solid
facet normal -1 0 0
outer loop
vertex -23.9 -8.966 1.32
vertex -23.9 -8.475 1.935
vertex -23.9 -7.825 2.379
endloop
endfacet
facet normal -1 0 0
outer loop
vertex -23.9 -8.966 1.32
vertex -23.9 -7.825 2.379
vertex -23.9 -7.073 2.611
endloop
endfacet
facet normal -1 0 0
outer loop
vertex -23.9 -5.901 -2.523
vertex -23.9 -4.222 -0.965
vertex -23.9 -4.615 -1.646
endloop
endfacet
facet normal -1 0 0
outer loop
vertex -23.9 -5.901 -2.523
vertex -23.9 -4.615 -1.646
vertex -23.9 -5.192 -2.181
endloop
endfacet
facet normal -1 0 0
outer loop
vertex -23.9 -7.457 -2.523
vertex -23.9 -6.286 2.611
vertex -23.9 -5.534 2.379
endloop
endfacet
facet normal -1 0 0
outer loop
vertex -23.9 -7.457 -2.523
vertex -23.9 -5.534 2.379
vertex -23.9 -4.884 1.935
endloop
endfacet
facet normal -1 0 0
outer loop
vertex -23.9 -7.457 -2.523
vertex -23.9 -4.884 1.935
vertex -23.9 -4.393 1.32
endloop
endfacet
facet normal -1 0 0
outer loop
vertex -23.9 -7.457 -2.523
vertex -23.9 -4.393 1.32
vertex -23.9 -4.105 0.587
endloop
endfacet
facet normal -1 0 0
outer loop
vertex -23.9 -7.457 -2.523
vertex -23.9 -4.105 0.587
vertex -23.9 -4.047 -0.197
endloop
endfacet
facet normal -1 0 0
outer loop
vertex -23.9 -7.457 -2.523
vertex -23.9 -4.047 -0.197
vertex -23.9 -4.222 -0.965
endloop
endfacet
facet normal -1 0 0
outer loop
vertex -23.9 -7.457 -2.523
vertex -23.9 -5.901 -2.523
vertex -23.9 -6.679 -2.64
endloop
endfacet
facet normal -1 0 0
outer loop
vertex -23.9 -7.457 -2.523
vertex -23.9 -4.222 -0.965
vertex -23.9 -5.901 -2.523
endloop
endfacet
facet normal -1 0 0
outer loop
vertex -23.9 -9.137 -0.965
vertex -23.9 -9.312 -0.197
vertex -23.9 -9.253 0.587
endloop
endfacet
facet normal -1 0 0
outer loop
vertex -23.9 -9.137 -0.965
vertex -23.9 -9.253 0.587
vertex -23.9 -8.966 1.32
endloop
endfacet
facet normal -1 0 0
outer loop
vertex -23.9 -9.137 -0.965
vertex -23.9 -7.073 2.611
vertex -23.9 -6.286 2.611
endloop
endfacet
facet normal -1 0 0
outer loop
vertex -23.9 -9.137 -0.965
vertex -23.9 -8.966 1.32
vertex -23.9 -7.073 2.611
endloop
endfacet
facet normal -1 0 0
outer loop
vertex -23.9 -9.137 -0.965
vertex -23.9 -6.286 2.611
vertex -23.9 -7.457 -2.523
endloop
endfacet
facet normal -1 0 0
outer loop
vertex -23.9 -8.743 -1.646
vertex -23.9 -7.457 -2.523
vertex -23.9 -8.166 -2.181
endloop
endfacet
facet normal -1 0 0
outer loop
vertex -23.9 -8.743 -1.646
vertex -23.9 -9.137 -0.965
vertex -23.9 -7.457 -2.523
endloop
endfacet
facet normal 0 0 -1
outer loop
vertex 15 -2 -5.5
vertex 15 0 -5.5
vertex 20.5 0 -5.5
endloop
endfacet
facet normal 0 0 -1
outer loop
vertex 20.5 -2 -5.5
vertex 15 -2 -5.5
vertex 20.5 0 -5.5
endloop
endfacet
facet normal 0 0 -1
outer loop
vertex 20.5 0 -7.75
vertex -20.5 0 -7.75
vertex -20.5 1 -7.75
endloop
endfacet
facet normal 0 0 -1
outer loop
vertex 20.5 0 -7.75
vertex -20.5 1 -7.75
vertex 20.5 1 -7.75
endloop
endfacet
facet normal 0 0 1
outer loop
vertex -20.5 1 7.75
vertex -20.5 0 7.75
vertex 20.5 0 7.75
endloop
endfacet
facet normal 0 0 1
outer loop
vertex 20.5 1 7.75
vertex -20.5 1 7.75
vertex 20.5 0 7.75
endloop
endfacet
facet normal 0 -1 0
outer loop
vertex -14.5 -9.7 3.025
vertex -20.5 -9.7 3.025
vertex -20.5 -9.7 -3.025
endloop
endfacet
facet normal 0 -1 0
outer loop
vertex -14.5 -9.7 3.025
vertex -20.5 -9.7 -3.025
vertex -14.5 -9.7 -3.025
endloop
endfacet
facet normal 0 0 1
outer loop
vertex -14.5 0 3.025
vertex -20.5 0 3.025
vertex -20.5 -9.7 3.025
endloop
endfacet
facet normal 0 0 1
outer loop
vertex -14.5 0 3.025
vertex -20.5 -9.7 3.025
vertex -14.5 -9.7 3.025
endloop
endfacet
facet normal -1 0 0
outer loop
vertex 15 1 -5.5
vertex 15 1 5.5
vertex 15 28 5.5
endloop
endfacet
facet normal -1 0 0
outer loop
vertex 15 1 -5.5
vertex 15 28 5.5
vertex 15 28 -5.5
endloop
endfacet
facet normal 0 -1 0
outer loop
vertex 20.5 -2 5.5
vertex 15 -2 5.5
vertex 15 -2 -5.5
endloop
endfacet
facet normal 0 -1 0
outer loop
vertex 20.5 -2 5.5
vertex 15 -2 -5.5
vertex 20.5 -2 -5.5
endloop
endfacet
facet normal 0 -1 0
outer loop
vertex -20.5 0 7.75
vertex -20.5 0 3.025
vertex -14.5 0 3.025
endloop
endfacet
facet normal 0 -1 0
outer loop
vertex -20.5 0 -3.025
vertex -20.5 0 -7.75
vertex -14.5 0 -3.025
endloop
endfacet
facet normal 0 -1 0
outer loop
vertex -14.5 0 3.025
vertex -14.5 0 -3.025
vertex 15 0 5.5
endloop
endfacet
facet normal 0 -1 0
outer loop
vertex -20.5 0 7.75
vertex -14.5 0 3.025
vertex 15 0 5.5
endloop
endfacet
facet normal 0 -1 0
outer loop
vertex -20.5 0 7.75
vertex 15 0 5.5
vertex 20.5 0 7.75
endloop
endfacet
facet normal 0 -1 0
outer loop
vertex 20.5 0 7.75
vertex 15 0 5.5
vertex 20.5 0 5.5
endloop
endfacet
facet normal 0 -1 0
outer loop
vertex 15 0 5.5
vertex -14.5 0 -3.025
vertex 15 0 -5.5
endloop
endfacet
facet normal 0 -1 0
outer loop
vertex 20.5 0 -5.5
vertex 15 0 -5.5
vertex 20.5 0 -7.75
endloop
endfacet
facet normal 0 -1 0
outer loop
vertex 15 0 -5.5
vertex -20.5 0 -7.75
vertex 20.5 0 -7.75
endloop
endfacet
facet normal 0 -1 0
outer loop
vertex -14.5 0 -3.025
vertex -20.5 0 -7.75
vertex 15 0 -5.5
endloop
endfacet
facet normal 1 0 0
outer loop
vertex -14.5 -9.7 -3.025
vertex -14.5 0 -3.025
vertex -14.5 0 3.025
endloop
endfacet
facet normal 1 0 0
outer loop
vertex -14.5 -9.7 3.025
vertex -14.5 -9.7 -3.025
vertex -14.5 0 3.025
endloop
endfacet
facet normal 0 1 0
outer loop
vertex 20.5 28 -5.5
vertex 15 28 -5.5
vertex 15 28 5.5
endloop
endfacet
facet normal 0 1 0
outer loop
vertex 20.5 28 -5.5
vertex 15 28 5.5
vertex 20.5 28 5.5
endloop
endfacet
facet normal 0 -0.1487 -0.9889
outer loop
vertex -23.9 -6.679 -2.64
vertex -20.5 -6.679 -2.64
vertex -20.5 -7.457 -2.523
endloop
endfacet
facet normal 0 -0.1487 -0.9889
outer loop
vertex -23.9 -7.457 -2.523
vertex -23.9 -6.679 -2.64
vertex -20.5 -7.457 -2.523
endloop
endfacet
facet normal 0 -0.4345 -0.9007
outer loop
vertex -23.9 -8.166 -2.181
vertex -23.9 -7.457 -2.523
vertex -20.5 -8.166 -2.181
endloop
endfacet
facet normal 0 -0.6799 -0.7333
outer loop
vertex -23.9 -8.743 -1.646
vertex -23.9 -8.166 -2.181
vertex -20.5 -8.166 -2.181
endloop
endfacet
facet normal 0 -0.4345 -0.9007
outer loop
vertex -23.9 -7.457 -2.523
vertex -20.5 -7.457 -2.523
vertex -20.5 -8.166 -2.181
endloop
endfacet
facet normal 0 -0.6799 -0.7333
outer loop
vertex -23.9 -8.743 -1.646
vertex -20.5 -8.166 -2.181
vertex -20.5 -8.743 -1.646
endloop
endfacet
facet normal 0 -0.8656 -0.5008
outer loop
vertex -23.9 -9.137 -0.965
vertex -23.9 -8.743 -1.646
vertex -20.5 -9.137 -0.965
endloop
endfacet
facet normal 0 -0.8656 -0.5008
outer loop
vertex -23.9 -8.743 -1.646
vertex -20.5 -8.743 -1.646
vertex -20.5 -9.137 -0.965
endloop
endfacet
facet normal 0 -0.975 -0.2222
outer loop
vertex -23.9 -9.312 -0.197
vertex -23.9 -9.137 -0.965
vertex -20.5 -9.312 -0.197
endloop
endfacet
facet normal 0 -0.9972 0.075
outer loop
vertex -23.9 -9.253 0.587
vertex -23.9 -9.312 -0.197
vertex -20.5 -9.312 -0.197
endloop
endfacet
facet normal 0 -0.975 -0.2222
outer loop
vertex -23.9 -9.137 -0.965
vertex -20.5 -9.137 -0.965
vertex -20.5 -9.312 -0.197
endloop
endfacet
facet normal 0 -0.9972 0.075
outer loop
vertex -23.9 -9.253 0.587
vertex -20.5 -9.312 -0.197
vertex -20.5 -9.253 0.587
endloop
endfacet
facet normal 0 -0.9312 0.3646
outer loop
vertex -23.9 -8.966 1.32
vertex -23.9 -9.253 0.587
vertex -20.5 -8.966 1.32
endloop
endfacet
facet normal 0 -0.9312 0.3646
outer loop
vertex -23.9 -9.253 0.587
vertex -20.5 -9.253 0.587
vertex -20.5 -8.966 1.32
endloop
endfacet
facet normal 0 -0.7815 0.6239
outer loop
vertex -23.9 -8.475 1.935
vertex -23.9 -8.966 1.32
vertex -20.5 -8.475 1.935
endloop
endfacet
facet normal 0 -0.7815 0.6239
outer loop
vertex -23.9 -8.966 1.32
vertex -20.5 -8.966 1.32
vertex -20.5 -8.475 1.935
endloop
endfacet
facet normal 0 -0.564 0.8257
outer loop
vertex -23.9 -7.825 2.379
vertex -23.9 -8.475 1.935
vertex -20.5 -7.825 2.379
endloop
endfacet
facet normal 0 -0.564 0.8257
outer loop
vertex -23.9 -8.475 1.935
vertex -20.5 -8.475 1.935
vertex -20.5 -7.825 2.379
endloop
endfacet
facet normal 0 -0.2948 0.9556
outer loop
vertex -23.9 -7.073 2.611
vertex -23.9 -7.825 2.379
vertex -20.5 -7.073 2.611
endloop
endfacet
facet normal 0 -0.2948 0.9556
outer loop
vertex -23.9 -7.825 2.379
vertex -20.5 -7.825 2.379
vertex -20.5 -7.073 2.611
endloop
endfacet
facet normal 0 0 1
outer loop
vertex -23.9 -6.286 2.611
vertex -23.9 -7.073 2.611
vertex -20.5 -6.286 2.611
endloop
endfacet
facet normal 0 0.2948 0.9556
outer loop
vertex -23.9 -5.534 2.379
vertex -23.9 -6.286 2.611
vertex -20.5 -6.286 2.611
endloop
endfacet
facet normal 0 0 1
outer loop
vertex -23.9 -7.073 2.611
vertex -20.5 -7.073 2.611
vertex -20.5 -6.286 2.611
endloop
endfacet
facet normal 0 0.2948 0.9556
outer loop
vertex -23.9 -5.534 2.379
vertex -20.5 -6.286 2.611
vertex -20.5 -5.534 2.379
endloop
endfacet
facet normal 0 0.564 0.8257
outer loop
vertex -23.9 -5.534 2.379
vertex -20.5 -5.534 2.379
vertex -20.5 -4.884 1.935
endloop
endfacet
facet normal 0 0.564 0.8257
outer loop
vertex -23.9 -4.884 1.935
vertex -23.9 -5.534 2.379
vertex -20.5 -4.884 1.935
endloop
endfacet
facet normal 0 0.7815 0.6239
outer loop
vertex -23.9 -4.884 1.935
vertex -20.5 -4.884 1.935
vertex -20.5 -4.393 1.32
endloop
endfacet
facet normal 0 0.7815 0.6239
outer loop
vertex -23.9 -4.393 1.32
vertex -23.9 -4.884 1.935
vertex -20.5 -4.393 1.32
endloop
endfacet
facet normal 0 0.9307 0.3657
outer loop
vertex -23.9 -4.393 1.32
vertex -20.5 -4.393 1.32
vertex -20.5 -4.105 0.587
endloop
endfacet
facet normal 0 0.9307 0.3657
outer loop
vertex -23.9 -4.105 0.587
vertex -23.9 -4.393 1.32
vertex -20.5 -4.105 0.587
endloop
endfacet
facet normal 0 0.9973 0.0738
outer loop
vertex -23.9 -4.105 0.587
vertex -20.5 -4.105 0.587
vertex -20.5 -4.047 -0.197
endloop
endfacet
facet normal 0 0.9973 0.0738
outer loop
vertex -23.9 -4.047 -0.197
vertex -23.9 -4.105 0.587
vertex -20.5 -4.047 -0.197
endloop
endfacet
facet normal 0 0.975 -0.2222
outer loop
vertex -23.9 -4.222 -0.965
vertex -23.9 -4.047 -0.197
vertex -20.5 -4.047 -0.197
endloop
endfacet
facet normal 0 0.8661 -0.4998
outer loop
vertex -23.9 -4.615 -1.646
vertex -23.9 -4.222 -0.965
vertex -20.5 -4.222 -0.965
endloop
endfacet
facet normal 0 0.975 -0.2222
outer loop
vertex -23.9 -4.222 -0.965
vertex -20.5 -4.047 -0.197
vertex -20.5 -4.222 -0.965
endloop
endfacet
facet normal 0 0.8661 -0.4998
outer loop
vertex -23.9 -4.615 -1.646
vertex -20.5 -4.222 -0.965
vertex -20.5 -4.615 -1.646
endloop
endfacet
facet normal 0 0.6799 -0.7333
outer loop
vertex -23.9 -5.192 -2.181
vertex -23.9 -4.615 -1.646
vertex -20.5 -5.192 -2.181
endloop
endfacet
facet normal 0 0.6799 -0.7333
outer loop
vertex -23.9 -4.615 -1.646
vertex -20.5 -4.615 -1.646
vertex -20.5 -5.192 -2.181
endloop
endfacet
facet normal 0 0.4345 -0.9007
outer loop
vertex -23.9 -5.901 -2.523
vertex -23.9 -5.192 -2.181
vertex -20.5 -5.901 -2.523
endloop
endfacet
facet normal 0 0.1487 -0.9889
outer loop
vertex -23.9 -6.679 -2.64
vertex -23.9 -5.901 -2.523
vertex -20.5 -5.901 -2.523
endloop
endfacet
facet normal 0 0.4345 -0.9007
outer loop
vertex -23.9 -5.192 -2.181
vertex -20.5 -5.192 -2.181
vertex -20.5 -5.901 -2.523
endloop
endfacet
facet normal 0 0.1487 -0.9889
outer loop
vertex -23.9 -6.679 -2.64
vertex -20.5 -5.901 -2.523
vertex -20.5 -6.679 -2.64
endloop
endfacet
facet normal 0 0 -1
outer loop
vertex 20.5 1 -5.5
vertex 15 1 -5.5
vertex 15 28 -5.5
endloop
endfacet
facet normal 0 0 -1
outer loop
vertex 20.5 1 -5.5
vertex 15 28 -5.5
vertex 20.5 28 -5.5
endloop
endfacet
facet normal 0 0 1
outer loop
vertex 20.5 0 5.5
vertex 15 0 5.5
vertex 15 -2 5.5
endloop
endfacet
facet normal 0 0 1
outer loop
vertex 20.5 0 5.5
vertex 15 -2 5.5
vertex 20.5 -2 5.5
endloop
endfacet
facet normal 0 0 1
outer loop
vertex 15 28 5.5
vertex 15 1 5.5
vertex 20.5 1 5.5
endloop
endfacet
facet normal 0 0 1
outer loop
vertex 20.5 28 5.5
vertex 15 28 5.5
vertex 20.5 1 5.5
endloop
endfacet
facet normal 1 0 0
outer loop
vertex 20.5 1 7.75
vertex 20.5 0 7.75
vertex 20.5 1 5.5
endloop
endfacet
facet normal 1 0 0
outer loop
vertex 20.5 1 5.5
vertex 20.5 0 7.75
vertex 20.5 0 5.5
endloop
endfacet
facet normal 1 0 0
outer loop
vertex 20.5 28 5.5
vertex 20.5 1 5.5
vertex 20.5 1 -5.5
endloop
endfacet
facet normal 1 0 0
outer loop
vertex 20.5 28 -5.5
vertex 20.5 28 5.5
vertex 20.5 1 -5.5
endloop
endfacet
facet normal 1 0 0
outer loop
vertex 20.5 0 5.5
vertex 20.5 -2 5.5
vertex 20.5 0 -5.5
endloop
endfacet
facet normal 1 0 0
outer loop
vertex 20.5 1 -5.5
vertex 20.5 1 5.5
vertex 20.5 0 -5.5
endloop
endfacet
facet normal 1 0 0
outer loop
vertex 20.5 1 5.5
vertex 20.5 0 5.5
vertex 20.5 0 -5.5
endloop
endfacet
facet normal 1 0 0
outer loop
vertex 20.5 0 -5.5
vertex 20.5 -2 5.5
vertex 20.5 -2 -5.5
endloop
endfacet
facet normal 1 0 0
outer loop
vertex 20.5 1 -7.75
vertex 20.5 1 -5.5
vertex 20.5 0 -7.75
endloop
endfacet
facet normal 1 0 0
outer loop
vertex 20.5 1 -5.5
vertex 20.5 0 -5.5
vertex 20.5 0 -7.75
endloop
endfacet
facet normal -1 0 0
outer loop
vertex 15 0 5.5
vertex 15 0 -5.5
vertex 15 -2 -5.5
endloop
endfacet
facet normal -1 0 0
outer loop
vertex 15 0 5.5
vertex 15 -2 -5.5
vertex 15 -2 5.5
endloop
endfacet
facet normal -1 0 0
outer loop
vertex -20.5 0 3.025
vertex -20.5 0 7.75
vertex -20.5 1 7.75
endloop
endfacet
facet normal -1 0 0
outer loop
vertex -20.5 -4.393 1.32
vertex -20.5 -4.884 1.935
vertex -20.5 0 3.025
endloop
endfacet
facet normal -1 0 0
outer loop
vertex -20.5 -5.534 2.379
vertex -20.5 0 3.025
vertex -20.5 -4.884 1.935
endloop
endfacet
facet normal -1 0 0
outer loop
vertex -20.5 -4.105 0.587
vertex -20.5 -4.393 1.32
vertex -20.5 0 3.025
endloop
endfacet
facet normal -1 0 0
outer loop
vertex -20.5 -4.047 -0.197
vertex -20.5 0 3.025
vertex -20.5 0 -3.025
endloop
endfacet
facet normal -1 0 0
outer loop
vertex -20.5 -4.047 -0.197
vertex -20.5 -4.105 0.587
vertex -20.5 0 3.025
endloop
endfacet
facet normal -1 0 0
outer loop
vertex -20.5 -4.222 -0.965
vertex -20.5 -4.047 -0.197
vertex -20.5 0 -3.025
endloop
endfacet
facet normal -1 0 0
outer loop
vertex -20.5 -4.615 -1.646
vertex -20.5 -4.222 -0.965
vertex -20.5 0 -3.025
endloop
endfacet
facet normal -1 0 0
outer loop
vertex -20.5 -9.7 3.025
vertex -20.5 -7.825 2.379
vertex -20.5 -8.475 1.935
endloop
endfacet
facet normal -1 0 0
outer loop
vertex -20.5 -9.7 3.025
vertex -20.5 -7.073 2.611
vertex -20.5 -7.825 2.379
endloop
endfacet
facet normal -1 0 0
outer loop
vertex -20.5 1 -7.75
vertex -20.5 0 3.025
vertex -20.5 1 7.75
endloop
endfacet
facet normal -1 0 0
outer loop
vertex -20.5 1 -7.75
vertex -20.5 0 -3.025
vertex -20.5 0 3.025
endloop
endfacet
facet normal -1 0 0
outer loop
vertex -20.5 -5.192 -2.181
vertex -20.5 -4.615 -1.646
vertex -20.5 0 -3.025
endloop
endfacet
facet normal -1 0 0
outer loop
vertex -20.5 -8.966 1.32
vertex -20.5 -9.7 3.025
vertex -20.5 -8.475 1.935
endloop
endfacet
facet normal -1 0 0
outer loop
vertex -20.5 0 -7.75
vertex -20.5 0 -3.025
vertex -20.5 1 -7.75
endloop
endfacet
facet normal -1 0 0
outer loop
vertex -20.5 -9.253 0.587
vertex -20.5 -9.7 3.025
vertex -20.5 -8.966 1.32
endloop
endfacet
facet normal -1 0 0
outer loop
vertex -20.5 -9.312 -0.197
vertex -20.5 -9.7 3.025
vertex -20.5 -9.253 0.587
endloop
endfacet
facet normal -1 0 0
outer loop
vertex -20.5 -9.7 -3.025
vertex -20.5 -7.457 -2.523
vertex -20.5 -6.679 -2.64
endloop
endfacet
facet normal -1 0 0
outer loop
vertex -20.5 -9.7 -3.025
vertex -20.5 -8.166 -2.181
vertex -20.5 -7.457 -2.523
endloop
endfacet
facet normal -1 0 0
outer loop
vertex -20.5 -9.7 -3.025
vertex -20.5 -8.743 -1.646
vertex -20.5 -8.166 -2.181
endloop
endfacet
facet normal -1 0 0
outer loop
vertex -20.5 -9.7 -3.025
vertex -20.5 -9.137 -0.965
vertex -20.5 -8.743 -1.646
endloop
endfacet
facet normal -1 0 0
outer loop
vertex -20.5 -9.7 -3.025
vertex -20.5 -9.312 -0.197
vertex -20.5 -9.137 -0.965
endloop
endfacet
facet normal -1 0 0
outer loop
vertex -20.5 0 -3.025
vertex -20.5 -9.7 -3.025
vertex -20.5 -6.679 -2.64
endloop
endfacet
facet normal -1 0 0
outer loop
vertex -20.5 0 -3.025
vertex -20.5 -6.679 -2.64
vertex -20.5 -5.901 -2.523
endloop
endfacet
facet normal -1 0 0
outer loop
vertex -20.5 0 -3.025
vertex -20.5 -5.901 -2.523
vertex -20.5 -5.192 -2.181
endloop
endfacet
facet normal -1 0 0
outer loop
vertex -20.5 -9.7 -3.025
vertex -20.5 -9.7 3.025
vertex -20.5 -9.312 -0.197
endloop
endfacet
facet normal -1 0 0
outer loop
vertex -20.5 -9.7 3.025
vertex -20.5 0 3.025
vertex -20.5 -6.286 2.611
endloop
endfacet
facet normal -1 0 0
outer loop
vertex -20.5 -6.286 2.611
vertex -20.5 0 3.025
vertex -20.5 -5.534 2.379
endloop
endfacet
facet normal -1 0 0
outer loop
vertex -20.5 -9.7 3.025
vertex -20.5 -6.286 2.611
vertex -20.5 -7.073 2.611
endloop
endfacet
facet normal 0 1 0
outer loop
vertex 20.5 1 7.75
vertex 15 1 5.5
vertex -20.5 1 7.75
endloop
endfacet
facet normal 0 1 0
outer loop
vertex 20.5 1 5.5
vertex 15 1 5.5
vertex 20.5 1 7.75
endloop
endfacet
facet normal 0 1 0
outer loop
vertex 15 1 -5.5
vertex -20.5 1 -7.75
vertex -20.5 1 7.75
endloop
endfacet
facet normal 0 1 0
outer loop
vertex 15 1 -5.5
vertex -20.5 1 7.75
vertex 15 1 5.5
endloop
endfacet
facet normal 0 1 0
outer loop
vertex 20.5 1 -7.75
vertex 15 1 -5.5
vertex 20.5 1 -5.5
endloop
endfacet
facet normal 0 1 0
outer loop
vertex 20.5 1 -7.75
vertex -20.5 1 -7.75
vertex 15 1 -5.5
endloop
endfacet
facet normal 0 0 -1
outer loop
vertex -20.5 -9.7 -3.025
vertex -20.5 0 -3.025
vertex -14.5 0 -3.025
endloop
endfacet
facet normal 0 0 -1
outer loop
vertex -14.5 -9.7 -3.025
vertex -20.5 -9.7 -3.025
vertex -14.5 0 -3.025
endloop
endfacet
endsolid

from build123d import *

# Parameters (mm, degrees)
SKETCH_1_W      = 41
SKETCH_1_H      = 15.5
EXTRUDE_1_DEPTH = 1
SKETCH_2_W      = 5.5
SKETCH_2_H      = 11
EXTRUDE_2_DEPTH = 27
SKETCH_3_W      = 5.5
SKETCH_3_H      = 11
EXTRUDE_3_DEPTH = 2
SKETCH_4_W      = 6
SKETCH_4_H      = 6.05
EXTRUDE_4_DEPTH = 9.7
SKETCH_5_R      = 2.64
EXTRUDE_5_DEPTH = 3.4


with BuildPart() as part:
    # 草图1 → 凸台-拉伸1 (new body)
    with BuildSketch(Plane(origin=(0, 0, 0), x_dir=(1, 0, 0), z_dir=(0, 1, 0))):
        Rectangle(SKETCH_1_W, SKETCH_1_H)
    extrude(amount=EXTRUDE_1_DEPTH)

    # 草图2 → 凸台-拉伸2 (add)
    with BuildSketch(Plane(origin=(0, 1, 0), x_dir=(1, 0, 0), z_dir=(0, 1, 0))):
        with Locations((17.75, 0)):
            Rectangle(SKETCH_2_W, SKETCH_2_H)
    extrude(amount=EXTRUDE_2_DEPTH)

    # 草图3 → 凸台-拉伸3 (add)
    with BuildSketch(Plane.XZ):
        with Locations((17.75, 0)):
            Rectangle(SKETCH_3_W, SKETCH_3_H)
    extrude(amount=EXTRUDE_3_DEPTH)

    # 草图4 → 凸台-拉伸4 (add)
    with BuildSketch(Plane.XZ):
        with Locations((-17.5, 0)):
            Rectangle(SKETCH_4_W, SKETCH_4_H)
    extrude(amount=EXTRUDE_4_DEPTH)

    # 草图5 → 凸台-拉伸5 (add)
    with BuildSketch(Plane.ZY.offset(20.5)):
        with Locations(Location((0, -6.679228268, 0), (0, 0, 180))):
            Circle(SKETCH_5_R)
    extrude(amount=EXTRUDE_5_DEPTH)


solid = part.part
